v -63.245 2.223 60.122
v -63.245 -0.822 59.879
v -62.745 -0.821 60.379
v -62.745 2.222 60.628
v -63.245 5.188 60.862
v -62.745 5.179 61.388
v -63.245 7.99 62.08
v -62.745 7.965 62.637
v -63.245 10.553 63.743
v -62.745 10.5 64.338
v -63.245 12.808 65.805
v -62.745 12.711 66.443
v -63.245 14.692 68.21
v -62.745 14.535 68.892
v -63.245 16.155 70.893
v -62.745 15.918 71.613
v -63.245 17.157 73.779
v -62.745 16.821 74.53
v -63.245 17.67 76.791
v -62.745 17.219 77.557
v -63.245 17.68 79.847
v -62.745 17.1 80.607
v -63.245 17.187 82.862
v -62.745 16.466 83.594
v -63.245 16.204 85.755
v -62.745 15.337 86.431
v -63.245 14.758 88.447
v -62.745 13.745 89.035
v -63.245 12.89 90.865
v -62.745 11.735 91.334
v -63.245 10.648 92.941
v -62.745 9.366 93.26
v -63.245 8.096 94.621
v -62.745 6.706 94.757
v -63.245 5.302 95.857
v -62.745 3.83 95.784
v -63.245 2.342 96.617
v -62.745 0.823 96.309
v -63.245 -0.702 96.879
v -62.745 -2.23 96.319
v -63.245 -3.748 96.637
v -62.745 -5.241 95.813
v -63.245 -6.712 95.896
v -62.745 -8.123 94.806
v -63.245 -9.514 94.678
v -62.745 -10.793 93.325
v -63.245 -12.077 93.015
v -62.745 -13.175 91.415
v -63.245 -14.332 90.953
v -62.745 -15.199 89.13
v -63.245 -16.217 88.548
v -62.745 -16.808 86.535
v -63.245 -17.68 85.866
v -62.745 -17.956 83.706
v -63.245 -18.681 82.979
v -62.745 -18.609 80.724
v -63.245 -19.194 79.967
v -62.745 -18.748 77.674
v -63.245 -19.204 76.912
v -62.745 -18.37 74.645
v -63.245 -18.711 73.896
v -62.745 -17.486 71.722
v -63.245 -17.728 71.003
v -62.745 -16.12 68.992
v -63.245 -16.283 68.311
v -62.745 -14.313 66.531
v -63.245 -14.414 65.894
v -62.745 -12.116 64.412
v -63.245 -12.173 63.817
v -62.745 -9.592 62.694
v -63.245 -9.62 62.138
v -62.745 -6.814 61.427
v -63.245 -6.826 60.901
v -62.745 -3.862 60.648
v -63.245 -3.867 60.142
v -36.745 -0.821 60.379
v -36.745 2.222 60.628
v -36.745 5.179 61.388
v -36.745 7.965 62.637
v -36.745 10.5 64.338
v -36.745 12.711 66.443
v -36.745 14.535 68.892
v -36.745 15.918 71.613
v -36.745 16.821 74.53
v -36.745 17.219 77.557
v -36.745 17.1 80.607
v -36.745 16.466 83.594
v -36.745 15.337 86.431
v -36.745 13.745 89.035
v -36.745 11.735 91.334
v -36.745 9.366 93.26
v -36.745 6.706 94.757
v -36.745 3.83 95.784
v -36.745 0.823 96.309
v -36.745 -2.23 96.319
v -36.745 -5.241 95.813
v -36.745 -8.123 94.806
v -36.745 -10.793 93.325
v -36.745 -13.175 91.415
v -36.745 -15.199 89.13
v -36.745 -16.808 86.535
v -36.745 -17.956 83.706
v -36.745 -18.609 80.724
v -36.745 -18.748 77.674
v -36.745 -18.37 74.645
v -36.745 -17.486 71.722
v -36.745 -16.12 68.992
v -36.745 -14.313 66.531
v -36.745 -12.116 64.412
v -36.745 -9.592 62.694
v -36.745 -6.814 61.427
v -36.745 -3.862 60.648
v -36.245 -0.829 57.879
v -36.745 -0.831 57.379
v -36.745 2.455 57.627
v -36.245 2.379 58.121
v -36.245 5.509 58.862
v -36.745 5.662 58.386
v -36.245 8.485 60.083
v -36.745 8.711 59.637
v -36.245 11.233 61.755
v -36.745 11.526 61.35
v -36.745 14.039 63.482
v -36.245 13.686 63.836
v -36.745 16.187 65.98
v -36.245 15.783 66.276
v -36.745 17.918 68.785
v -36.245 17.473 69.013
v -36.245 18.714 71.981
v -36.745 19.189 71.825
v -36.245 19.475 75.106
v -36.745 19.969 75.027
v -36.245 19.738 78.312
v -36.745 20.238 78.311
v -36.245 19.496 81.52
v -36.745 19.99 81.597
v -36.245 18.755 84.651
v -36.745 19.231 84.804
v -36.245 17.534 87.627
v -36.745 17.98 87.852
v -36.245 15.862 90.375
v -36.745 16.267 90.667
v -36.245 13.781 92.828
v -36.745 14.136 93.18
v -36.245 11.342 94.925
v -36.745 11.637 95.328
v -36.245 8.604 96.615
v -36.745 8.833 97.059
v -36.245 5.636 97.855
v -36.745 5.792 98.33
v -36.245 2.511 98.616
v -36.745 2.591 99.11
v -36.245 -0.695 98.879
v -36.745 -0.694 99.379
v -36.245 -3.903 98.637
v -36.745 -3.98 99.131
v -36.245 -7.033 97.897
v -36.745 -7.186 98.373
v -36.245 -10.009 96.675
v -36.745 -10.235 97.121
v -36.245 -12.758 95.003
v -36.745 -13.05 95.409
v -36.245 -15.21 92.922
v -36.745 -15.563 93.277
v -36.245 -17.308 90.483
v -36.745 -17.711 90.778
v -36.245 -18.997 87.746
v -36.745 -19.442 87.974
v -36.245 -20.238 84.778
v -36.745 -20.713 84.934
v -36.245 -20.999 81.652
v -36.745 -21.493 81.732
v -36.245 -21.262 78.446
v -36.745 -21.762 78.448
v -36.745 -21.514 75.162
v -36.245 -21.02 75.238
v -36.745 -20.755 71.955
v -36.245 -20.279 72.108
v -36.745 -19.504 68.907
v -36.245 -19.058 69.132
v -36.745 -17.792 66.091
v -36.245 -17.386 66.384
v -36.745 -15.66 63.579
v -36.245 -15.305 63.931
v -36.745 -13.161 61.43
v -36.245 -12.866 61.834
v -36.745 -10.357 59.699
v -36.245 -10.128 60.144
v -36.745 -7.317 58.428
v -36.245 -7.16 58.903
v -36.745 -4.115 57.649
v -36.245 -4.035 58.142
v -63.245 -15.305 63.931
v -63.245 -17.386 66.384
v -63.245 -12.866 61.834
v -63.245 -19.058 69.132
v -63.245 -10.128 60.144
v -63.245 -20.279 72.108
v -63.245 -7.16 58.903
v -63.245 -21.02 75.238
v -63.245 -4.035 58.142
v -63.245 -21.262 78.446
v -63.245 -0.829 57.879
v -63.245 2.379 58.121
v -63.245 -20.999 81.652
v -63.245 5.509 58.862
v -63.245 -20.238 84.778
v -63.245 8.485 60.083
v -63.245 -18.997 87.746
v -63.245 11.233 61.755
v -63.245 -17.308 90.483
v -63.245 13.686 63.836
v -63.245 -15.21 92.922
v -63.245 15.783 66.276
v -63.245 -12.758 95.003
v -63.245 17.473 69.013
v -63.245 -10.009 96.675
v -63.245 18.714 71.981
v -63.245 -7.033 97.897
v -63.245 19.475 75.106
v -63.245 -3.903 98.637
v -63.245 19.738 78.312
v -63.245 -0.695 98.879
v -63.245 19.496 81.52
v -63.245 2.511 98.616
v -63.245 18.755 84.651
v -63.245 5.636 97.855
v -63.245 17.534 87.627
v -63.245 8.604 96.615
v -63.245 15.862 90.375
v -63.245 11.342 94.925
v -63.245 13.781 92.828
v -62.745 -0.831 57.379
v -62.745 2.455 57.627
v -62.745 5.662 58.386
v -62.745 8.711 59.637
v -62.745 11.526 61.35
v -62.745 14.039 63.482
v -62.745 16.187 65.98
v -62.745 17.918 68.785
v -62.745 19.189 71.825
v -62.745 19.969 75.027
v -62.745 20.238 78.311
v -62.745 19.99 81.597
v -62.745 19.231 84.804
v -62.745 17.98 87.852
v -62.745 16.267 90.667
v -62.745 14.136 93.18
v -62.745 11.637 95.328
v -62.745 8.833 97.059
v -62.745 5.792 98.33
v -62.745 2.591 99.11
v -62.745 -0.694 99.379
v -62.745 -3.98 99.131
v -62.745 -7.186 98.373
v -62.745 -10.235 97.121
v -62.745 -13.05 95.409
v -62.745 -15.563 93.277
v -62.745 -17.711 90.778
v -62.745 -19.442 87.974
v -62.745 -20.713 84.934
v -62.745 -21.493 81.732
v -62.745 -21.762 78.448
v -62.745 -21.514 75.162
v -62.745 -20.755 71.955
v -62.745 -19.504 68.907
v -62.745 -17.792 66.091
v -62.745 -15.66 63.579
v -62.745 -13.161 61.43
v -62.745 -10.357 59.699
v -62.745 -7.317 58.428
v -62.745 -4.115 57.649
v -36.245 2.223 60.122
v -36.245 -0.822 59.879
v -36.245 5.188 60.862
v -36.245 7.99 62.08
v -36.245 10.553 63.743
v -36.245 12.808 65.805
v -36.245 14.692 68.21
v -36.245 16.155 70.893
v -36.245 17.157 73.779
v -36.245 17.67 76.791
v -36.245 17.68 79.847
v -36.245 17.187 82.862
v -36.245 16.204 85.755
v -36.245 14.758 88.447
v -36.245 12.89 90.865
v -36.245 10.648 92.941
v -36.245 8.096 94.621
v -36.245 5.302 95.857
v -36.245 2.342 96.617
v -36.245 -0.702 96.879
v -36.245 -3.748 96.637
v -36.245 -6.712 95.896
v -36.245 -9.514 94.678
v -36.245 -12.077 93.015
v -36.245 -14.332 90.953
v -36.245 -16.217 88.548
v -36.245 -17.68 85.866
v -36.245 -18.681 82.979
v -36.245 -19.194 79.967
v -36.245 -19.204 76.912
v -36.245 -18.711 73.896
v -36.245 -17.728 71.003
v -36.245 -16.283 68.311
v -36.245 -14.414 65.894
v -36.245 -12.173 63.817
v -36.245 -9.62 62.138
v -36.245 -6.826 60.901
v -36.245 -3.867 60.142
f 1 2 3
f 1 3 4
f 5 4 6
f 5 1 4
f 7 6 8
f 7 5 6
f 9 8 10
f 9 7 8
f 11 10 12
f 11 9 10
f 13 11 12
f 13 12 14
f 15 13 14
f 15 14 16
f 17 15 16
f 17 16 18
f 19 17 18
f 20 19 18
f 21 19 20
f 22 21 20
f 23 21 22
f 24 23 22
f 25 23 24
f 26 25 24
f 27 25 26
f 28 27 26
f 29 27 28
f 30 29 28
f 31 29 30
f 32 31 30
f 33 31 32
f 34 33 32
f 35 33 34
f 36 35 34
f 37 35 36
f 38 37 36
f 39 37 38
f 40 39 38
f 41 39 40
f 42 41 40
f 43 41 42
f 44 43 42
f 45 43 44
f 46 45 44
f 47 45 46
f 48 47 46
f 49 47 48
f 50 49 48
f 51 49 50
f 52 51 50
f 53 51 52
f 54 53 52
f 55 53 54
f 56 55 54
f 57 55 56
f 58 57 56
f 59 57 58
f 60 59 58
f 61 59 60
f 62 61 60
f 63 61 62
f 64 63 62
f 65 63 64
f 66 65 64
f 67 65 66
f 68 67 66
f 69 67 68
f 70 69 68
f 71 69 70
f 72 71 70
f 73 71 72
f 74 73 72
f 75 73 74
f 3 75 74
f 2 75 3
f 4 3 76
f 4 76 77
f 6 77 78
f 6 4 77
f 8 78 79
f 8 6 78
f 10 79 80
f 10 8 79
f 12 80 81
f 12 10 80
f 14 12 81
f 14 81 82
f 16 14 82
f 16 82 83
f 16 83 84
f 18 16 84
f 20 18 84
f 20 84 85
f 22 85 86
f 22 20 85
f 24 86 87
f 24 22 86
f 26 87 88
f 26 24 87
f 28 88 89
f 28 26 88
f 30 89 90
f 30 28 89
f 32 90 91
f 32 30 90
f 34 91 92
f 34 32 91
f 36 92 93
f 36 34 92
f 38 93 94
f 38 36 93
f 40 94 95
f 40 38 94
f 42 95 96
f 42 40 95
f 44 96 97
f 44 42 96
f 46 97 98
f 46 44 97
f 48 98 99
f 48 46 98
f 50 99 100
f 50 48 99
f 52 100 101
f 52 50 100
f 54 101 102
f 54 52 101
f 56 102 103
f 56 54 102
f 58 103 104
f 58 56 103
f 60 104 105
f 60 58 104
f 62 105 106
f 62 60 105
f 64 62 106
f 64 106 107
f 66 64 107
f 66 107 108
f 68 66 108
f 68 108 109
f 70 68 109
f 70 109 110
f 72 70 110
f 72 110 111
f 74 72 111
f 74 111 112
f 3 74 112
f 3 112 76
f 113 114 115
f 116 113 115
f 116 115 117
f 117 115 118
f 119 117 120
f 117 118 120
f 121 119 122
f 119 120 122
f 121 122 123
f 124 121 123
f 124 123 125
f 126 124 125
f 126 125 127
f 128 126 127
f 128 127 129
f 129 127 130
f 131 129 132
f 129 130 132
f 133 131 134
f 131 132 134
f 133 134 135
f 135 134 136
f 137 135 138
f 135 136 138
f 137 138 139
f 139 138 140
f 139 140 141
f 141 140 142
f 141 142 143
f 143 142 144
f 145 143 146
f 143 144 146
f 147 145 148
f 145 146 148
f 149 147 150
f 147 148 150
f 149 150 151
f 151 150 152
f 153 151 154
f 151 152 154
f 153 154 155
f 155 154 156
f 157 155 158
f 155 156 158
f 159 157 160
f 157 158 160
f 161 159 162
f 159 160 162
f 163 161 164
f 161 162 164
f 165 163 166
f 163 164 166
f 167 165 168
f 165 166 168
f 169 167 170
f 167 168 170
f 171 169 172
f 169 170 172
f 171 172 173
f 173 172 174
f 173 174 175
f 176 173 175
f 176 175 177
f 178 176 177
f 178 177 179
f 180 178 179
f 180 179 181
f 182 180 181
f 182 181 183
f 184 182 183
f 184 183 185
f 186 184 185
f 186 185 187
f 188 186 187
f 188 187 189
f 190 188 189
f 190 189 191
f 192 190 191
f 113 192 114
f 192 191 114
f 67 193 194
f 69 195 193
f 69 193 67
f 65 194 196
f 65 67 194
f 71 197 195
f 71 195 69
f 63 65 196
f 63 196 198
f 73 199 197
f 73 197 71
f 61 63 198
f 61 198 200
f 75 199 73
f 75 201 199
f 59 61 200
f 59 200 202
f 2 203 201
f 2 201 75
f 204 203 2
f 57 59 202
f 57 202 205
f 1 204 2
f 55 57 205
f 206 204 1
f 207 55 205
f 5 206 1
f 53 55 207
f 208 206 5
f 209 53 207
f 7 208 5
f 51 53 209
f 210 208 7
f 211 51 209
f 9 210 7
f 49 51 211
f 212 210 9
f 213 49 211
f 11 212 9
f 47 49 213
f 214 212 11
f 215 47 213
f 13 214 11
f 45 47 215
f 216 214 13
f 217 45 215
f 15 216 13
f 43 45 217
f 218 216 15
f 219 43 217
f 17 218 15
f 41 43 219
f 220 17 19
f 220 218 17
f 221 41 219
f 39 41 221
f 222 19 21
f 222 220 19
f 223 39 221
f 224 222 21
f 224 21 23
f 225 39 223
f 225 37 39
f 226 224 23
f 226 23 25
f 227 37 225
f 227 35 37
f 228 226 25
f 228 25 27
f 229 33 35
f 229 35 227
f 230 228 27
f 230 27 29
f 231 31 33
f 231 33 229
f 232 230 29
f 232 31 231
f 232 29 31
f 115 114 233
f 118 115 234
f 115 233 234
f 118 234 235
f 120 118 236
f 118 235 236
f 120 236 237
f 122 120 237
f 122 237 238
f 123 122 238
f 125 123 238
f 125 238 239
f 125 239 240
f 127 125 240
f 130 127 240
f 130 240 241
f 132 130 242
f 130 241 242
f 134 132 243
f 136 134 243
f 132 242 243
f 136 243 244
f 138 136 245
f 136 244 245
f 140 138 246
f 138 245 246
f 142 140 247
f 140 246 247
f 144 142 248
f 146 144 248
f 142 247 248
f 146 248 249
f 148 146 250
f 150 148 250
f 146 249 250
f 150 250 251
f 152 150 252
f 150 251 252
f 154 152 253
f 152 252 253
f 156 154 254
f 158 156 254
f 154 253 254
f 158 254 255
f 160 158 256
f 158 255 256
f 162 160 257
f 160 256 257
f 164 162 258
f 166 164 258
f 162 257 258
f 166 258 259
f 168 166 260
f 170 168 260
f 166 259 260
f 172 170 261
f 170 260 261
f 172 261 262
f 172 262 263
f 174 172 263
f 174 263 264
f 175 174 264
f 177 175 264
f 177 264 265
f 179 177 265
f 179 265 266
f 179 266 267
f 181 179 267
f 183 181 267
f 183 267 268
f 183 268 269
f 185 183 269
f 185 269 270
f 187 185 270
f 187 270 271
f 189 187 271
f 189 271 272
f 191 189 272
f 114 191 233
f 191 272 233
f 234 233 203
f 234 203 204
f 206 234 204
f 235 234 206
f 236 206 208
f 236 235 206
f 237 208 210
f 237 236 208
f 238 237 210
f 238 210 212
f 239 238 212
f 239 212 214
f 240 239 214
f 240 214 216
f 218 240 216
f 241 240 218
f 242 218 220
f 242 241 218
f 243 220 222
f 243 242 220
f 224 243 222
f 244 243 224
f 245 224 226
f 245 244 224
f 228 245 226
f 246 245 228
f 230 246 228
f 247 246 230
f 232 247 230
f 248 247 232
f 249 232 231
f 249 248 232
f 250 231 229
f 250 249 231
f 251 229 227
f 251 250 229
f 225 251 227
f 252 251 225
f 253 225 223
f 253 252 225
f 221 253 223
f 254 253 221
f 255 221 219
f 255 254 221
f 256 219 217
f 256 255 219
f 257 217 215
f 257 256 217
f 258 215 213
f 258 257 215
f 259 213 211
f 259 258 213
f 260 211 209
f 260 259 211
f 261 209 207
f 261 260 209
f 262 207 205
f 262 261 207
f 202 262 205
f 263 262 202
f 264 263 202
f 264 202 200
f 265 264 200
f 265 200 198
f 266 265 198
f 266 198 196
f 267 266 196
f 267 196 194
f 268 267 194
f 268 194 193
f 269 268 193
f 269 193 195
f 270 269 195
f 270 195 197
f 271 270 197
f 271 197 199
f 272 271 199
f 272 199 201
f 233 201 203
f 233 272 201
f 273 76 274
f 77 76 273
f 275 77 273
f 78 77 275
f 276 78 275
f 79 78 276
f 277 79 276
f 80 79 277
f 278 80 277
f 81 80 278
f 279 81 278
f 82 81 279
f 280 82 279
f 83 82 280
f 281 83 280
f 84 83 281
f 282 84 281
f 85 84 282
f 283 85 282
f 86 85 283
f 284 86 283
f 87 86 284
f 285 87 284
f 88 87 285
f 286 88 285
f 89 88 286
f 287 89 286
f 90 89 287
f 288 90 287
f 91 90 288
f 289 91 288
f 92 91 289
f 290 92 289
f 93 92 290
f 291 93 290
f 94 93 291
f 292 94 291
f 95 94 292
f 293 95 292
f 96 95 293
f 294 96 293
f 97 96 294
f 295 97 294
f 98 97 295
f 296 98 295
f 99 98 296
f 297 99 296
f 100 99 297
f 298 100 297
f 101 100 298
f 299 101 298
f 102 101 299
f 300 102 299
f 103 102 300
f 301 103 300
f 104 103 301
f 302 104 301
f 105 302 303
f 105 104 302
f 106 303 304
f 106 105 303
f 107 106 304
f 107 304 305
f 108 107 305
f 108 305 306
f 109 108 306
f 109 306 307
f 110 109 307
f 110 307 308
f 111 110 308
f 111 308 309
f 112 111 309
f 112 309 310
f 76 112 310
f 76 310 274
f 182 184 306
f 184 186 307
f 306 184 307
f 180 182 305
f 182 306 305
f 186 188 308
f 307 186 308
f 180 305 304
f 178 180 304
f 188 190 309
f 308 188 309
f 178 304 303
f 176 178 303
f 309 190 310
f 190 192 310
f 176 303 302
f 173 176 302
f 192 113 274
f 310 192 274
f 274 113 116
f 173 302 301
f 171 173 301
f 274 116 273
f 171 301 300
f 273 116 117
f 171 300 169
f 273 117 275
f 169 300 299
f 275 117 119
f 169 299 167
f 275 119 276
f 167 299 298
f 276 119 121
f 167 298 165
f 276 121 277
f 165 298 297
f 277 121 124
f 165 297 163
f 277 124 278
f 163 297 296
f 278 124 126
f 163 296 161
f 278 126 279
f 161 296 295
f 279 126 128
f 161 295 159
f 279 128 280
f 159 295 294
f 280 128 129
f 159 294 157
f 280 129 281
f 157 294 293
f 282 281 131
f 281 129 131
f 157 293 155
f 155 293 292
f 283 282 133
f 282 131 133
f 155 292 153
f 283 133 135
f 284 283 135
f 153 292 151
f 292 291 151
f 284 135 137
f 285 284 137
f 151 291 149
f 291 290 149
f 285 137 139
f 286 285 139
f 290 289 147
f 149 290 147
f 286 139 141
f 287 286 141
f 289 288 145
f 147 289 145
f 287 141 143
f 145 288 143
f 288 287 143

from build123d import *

# Parameters (mm, degrees)
SKETCH_1_W     = 27
SKETCH_1_H     = 3
CHAMFER_1_SIZE = 0.5


with BuildPart() as part:
    # 草图1 → 旋转1 (revolve)
    with BuildSketch(Plane(origin=(-4266.423458032, -24.943356191, -7335.56447096), x_dir=(-1, 0, 0), z_dir=(0, -0.999994681, 0.00326158))):
        with Locations((-4216.678380328, -7394.483238222)):
            Rectangle(SKETCH_1_W, SKETCH_1_H)
    revolve(axis=Axis((-153.375983394, -0.762059862, 78.379332546), (1, 0, 0)))

    # 倒角1
    chamfer_1_edges = [part.edges().sort_by_distance(p)[0] for p in [
        (-63.245077704, -0.693566691, 99.379220848),
        (-36.245077704, -0.693566691, 99.379220848),
        (-36.245077704, -0.70335143, 96.379236805),
        (-63.245077704, -0.70335143, 96.379236805),
    ]]
    chamfer(chamfer_1_edges, length=CHAMFER_1_SIZE)


solid = part.part
